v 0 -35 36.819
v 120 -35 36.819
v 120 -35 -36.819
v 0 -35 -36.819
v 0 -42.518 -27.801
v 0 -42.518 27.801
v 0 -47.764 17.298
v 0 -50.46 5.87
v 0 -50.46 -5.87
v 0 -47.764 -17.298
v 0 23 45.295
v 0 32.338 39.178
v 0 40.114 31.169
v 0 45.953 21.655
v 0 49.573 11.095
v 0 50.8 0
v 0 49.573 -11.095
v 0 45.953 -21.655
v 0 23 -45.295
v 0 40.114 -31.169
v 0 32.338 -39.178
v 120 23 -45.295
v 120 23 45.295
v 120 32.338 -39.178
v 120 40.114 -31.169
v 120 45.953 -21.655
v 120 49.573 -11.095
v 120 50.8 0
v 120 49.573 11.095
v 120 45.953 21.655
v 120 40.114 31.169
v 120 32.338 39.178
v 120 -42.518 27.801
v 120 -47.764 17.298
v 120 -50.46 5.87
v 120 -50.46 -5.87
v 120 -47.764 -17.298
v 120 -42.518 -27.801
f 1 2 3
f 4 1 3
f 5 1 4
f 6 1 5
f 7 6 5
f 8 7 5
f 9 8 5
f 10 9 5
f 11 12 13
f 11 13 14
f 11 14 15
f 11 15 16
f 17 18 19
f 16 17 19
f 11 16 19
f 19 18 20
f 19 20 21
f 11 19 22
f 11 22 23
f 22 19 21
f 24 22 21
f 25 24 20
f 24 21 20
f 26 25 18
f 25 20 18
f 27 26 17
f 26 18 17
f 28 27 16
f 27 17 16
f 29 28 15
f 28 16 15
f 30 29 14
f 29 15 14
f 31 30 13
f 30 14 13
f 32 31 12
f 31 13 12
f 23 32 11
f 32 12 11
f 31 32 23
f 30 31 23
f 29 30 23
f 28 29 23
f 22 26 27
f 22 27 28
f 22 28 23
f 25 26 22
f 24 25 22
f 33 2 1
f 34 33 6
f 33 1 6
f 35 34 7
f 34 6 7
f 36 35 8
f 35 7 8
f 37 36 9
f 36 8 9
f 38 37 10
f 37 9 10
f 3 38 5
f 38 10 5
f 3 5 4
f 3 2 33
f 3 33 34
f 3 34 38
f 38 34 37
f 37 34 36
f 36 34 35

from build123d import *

# Parameters (mm, degrees)
SKETCH1_R           = 50.8
SKETCH1_W           = 60
SKETCH1_H           = 58
BOSS_EXTRUDE1_DEPTH = 120
CUT_EXTRUDE1_DEPTH  = 140.861645922


with BuildPart() as part:
    # Sketch1 → Boss-Extrude1 (new body)
    with BuildSketch(Plane(origin=(0, 0, 0), x_dir=(0, 0, -1), z_dir=(1, 0, 0))):
        Circle(SKETCH1_R)
        with Locations((0, -6)):
            Rectangle(SKETCH1_W, SKETCH1_H, mode=Mode.SUBTRACT)
    extrude(amount=BOSS_EXTRUDE1_DEPTH)

    # Sketch4 → Cut-Extrude1 (cut, through all)
    with BuildSketch(Plane(origin=(120, 0, 0), x_dir=(0, 0, -1), z_dir=(1, 0, 0))):
        with BuildLine():
            Line((45.29503284, 23), (-45.29503284, 23))
            ThreePointArc((-45.29503284, 23), (-50.26608487, -7.345795523), (-36.819016826, -35))
            Line((-36.819016826, -35), (36.819016826, -35))
            ThreePointArc((36.819016826, -35), (50.26608487, -7.345795523), (45.29503284, 23))
        make_face()
    extrude(amount=-CUT_EXTRUDE1_DEPTH, mode=Mode.SUBTRACT)


with BuildPart() as cut_extrude1_piece_1:
    # of the separate pieces the step leaves, piece 1, a body of its own (cut_extrude1_pieces)
    add(part.part.solids().sort_by_distance((0, 23, -45.29503284))[0])


with BuildPart() as cut_extrude1_piece_2:
    # of the separate pieces the step leaves, piece 2, a body of its own (cut_extrude1_pieces)
    add(part.part.solids().sort_by_distance((0, -35, 36.819016826))[0])


solid = Compound([cut_extrude1_piece_1.part, cut_extrude1_piece_2.part])
